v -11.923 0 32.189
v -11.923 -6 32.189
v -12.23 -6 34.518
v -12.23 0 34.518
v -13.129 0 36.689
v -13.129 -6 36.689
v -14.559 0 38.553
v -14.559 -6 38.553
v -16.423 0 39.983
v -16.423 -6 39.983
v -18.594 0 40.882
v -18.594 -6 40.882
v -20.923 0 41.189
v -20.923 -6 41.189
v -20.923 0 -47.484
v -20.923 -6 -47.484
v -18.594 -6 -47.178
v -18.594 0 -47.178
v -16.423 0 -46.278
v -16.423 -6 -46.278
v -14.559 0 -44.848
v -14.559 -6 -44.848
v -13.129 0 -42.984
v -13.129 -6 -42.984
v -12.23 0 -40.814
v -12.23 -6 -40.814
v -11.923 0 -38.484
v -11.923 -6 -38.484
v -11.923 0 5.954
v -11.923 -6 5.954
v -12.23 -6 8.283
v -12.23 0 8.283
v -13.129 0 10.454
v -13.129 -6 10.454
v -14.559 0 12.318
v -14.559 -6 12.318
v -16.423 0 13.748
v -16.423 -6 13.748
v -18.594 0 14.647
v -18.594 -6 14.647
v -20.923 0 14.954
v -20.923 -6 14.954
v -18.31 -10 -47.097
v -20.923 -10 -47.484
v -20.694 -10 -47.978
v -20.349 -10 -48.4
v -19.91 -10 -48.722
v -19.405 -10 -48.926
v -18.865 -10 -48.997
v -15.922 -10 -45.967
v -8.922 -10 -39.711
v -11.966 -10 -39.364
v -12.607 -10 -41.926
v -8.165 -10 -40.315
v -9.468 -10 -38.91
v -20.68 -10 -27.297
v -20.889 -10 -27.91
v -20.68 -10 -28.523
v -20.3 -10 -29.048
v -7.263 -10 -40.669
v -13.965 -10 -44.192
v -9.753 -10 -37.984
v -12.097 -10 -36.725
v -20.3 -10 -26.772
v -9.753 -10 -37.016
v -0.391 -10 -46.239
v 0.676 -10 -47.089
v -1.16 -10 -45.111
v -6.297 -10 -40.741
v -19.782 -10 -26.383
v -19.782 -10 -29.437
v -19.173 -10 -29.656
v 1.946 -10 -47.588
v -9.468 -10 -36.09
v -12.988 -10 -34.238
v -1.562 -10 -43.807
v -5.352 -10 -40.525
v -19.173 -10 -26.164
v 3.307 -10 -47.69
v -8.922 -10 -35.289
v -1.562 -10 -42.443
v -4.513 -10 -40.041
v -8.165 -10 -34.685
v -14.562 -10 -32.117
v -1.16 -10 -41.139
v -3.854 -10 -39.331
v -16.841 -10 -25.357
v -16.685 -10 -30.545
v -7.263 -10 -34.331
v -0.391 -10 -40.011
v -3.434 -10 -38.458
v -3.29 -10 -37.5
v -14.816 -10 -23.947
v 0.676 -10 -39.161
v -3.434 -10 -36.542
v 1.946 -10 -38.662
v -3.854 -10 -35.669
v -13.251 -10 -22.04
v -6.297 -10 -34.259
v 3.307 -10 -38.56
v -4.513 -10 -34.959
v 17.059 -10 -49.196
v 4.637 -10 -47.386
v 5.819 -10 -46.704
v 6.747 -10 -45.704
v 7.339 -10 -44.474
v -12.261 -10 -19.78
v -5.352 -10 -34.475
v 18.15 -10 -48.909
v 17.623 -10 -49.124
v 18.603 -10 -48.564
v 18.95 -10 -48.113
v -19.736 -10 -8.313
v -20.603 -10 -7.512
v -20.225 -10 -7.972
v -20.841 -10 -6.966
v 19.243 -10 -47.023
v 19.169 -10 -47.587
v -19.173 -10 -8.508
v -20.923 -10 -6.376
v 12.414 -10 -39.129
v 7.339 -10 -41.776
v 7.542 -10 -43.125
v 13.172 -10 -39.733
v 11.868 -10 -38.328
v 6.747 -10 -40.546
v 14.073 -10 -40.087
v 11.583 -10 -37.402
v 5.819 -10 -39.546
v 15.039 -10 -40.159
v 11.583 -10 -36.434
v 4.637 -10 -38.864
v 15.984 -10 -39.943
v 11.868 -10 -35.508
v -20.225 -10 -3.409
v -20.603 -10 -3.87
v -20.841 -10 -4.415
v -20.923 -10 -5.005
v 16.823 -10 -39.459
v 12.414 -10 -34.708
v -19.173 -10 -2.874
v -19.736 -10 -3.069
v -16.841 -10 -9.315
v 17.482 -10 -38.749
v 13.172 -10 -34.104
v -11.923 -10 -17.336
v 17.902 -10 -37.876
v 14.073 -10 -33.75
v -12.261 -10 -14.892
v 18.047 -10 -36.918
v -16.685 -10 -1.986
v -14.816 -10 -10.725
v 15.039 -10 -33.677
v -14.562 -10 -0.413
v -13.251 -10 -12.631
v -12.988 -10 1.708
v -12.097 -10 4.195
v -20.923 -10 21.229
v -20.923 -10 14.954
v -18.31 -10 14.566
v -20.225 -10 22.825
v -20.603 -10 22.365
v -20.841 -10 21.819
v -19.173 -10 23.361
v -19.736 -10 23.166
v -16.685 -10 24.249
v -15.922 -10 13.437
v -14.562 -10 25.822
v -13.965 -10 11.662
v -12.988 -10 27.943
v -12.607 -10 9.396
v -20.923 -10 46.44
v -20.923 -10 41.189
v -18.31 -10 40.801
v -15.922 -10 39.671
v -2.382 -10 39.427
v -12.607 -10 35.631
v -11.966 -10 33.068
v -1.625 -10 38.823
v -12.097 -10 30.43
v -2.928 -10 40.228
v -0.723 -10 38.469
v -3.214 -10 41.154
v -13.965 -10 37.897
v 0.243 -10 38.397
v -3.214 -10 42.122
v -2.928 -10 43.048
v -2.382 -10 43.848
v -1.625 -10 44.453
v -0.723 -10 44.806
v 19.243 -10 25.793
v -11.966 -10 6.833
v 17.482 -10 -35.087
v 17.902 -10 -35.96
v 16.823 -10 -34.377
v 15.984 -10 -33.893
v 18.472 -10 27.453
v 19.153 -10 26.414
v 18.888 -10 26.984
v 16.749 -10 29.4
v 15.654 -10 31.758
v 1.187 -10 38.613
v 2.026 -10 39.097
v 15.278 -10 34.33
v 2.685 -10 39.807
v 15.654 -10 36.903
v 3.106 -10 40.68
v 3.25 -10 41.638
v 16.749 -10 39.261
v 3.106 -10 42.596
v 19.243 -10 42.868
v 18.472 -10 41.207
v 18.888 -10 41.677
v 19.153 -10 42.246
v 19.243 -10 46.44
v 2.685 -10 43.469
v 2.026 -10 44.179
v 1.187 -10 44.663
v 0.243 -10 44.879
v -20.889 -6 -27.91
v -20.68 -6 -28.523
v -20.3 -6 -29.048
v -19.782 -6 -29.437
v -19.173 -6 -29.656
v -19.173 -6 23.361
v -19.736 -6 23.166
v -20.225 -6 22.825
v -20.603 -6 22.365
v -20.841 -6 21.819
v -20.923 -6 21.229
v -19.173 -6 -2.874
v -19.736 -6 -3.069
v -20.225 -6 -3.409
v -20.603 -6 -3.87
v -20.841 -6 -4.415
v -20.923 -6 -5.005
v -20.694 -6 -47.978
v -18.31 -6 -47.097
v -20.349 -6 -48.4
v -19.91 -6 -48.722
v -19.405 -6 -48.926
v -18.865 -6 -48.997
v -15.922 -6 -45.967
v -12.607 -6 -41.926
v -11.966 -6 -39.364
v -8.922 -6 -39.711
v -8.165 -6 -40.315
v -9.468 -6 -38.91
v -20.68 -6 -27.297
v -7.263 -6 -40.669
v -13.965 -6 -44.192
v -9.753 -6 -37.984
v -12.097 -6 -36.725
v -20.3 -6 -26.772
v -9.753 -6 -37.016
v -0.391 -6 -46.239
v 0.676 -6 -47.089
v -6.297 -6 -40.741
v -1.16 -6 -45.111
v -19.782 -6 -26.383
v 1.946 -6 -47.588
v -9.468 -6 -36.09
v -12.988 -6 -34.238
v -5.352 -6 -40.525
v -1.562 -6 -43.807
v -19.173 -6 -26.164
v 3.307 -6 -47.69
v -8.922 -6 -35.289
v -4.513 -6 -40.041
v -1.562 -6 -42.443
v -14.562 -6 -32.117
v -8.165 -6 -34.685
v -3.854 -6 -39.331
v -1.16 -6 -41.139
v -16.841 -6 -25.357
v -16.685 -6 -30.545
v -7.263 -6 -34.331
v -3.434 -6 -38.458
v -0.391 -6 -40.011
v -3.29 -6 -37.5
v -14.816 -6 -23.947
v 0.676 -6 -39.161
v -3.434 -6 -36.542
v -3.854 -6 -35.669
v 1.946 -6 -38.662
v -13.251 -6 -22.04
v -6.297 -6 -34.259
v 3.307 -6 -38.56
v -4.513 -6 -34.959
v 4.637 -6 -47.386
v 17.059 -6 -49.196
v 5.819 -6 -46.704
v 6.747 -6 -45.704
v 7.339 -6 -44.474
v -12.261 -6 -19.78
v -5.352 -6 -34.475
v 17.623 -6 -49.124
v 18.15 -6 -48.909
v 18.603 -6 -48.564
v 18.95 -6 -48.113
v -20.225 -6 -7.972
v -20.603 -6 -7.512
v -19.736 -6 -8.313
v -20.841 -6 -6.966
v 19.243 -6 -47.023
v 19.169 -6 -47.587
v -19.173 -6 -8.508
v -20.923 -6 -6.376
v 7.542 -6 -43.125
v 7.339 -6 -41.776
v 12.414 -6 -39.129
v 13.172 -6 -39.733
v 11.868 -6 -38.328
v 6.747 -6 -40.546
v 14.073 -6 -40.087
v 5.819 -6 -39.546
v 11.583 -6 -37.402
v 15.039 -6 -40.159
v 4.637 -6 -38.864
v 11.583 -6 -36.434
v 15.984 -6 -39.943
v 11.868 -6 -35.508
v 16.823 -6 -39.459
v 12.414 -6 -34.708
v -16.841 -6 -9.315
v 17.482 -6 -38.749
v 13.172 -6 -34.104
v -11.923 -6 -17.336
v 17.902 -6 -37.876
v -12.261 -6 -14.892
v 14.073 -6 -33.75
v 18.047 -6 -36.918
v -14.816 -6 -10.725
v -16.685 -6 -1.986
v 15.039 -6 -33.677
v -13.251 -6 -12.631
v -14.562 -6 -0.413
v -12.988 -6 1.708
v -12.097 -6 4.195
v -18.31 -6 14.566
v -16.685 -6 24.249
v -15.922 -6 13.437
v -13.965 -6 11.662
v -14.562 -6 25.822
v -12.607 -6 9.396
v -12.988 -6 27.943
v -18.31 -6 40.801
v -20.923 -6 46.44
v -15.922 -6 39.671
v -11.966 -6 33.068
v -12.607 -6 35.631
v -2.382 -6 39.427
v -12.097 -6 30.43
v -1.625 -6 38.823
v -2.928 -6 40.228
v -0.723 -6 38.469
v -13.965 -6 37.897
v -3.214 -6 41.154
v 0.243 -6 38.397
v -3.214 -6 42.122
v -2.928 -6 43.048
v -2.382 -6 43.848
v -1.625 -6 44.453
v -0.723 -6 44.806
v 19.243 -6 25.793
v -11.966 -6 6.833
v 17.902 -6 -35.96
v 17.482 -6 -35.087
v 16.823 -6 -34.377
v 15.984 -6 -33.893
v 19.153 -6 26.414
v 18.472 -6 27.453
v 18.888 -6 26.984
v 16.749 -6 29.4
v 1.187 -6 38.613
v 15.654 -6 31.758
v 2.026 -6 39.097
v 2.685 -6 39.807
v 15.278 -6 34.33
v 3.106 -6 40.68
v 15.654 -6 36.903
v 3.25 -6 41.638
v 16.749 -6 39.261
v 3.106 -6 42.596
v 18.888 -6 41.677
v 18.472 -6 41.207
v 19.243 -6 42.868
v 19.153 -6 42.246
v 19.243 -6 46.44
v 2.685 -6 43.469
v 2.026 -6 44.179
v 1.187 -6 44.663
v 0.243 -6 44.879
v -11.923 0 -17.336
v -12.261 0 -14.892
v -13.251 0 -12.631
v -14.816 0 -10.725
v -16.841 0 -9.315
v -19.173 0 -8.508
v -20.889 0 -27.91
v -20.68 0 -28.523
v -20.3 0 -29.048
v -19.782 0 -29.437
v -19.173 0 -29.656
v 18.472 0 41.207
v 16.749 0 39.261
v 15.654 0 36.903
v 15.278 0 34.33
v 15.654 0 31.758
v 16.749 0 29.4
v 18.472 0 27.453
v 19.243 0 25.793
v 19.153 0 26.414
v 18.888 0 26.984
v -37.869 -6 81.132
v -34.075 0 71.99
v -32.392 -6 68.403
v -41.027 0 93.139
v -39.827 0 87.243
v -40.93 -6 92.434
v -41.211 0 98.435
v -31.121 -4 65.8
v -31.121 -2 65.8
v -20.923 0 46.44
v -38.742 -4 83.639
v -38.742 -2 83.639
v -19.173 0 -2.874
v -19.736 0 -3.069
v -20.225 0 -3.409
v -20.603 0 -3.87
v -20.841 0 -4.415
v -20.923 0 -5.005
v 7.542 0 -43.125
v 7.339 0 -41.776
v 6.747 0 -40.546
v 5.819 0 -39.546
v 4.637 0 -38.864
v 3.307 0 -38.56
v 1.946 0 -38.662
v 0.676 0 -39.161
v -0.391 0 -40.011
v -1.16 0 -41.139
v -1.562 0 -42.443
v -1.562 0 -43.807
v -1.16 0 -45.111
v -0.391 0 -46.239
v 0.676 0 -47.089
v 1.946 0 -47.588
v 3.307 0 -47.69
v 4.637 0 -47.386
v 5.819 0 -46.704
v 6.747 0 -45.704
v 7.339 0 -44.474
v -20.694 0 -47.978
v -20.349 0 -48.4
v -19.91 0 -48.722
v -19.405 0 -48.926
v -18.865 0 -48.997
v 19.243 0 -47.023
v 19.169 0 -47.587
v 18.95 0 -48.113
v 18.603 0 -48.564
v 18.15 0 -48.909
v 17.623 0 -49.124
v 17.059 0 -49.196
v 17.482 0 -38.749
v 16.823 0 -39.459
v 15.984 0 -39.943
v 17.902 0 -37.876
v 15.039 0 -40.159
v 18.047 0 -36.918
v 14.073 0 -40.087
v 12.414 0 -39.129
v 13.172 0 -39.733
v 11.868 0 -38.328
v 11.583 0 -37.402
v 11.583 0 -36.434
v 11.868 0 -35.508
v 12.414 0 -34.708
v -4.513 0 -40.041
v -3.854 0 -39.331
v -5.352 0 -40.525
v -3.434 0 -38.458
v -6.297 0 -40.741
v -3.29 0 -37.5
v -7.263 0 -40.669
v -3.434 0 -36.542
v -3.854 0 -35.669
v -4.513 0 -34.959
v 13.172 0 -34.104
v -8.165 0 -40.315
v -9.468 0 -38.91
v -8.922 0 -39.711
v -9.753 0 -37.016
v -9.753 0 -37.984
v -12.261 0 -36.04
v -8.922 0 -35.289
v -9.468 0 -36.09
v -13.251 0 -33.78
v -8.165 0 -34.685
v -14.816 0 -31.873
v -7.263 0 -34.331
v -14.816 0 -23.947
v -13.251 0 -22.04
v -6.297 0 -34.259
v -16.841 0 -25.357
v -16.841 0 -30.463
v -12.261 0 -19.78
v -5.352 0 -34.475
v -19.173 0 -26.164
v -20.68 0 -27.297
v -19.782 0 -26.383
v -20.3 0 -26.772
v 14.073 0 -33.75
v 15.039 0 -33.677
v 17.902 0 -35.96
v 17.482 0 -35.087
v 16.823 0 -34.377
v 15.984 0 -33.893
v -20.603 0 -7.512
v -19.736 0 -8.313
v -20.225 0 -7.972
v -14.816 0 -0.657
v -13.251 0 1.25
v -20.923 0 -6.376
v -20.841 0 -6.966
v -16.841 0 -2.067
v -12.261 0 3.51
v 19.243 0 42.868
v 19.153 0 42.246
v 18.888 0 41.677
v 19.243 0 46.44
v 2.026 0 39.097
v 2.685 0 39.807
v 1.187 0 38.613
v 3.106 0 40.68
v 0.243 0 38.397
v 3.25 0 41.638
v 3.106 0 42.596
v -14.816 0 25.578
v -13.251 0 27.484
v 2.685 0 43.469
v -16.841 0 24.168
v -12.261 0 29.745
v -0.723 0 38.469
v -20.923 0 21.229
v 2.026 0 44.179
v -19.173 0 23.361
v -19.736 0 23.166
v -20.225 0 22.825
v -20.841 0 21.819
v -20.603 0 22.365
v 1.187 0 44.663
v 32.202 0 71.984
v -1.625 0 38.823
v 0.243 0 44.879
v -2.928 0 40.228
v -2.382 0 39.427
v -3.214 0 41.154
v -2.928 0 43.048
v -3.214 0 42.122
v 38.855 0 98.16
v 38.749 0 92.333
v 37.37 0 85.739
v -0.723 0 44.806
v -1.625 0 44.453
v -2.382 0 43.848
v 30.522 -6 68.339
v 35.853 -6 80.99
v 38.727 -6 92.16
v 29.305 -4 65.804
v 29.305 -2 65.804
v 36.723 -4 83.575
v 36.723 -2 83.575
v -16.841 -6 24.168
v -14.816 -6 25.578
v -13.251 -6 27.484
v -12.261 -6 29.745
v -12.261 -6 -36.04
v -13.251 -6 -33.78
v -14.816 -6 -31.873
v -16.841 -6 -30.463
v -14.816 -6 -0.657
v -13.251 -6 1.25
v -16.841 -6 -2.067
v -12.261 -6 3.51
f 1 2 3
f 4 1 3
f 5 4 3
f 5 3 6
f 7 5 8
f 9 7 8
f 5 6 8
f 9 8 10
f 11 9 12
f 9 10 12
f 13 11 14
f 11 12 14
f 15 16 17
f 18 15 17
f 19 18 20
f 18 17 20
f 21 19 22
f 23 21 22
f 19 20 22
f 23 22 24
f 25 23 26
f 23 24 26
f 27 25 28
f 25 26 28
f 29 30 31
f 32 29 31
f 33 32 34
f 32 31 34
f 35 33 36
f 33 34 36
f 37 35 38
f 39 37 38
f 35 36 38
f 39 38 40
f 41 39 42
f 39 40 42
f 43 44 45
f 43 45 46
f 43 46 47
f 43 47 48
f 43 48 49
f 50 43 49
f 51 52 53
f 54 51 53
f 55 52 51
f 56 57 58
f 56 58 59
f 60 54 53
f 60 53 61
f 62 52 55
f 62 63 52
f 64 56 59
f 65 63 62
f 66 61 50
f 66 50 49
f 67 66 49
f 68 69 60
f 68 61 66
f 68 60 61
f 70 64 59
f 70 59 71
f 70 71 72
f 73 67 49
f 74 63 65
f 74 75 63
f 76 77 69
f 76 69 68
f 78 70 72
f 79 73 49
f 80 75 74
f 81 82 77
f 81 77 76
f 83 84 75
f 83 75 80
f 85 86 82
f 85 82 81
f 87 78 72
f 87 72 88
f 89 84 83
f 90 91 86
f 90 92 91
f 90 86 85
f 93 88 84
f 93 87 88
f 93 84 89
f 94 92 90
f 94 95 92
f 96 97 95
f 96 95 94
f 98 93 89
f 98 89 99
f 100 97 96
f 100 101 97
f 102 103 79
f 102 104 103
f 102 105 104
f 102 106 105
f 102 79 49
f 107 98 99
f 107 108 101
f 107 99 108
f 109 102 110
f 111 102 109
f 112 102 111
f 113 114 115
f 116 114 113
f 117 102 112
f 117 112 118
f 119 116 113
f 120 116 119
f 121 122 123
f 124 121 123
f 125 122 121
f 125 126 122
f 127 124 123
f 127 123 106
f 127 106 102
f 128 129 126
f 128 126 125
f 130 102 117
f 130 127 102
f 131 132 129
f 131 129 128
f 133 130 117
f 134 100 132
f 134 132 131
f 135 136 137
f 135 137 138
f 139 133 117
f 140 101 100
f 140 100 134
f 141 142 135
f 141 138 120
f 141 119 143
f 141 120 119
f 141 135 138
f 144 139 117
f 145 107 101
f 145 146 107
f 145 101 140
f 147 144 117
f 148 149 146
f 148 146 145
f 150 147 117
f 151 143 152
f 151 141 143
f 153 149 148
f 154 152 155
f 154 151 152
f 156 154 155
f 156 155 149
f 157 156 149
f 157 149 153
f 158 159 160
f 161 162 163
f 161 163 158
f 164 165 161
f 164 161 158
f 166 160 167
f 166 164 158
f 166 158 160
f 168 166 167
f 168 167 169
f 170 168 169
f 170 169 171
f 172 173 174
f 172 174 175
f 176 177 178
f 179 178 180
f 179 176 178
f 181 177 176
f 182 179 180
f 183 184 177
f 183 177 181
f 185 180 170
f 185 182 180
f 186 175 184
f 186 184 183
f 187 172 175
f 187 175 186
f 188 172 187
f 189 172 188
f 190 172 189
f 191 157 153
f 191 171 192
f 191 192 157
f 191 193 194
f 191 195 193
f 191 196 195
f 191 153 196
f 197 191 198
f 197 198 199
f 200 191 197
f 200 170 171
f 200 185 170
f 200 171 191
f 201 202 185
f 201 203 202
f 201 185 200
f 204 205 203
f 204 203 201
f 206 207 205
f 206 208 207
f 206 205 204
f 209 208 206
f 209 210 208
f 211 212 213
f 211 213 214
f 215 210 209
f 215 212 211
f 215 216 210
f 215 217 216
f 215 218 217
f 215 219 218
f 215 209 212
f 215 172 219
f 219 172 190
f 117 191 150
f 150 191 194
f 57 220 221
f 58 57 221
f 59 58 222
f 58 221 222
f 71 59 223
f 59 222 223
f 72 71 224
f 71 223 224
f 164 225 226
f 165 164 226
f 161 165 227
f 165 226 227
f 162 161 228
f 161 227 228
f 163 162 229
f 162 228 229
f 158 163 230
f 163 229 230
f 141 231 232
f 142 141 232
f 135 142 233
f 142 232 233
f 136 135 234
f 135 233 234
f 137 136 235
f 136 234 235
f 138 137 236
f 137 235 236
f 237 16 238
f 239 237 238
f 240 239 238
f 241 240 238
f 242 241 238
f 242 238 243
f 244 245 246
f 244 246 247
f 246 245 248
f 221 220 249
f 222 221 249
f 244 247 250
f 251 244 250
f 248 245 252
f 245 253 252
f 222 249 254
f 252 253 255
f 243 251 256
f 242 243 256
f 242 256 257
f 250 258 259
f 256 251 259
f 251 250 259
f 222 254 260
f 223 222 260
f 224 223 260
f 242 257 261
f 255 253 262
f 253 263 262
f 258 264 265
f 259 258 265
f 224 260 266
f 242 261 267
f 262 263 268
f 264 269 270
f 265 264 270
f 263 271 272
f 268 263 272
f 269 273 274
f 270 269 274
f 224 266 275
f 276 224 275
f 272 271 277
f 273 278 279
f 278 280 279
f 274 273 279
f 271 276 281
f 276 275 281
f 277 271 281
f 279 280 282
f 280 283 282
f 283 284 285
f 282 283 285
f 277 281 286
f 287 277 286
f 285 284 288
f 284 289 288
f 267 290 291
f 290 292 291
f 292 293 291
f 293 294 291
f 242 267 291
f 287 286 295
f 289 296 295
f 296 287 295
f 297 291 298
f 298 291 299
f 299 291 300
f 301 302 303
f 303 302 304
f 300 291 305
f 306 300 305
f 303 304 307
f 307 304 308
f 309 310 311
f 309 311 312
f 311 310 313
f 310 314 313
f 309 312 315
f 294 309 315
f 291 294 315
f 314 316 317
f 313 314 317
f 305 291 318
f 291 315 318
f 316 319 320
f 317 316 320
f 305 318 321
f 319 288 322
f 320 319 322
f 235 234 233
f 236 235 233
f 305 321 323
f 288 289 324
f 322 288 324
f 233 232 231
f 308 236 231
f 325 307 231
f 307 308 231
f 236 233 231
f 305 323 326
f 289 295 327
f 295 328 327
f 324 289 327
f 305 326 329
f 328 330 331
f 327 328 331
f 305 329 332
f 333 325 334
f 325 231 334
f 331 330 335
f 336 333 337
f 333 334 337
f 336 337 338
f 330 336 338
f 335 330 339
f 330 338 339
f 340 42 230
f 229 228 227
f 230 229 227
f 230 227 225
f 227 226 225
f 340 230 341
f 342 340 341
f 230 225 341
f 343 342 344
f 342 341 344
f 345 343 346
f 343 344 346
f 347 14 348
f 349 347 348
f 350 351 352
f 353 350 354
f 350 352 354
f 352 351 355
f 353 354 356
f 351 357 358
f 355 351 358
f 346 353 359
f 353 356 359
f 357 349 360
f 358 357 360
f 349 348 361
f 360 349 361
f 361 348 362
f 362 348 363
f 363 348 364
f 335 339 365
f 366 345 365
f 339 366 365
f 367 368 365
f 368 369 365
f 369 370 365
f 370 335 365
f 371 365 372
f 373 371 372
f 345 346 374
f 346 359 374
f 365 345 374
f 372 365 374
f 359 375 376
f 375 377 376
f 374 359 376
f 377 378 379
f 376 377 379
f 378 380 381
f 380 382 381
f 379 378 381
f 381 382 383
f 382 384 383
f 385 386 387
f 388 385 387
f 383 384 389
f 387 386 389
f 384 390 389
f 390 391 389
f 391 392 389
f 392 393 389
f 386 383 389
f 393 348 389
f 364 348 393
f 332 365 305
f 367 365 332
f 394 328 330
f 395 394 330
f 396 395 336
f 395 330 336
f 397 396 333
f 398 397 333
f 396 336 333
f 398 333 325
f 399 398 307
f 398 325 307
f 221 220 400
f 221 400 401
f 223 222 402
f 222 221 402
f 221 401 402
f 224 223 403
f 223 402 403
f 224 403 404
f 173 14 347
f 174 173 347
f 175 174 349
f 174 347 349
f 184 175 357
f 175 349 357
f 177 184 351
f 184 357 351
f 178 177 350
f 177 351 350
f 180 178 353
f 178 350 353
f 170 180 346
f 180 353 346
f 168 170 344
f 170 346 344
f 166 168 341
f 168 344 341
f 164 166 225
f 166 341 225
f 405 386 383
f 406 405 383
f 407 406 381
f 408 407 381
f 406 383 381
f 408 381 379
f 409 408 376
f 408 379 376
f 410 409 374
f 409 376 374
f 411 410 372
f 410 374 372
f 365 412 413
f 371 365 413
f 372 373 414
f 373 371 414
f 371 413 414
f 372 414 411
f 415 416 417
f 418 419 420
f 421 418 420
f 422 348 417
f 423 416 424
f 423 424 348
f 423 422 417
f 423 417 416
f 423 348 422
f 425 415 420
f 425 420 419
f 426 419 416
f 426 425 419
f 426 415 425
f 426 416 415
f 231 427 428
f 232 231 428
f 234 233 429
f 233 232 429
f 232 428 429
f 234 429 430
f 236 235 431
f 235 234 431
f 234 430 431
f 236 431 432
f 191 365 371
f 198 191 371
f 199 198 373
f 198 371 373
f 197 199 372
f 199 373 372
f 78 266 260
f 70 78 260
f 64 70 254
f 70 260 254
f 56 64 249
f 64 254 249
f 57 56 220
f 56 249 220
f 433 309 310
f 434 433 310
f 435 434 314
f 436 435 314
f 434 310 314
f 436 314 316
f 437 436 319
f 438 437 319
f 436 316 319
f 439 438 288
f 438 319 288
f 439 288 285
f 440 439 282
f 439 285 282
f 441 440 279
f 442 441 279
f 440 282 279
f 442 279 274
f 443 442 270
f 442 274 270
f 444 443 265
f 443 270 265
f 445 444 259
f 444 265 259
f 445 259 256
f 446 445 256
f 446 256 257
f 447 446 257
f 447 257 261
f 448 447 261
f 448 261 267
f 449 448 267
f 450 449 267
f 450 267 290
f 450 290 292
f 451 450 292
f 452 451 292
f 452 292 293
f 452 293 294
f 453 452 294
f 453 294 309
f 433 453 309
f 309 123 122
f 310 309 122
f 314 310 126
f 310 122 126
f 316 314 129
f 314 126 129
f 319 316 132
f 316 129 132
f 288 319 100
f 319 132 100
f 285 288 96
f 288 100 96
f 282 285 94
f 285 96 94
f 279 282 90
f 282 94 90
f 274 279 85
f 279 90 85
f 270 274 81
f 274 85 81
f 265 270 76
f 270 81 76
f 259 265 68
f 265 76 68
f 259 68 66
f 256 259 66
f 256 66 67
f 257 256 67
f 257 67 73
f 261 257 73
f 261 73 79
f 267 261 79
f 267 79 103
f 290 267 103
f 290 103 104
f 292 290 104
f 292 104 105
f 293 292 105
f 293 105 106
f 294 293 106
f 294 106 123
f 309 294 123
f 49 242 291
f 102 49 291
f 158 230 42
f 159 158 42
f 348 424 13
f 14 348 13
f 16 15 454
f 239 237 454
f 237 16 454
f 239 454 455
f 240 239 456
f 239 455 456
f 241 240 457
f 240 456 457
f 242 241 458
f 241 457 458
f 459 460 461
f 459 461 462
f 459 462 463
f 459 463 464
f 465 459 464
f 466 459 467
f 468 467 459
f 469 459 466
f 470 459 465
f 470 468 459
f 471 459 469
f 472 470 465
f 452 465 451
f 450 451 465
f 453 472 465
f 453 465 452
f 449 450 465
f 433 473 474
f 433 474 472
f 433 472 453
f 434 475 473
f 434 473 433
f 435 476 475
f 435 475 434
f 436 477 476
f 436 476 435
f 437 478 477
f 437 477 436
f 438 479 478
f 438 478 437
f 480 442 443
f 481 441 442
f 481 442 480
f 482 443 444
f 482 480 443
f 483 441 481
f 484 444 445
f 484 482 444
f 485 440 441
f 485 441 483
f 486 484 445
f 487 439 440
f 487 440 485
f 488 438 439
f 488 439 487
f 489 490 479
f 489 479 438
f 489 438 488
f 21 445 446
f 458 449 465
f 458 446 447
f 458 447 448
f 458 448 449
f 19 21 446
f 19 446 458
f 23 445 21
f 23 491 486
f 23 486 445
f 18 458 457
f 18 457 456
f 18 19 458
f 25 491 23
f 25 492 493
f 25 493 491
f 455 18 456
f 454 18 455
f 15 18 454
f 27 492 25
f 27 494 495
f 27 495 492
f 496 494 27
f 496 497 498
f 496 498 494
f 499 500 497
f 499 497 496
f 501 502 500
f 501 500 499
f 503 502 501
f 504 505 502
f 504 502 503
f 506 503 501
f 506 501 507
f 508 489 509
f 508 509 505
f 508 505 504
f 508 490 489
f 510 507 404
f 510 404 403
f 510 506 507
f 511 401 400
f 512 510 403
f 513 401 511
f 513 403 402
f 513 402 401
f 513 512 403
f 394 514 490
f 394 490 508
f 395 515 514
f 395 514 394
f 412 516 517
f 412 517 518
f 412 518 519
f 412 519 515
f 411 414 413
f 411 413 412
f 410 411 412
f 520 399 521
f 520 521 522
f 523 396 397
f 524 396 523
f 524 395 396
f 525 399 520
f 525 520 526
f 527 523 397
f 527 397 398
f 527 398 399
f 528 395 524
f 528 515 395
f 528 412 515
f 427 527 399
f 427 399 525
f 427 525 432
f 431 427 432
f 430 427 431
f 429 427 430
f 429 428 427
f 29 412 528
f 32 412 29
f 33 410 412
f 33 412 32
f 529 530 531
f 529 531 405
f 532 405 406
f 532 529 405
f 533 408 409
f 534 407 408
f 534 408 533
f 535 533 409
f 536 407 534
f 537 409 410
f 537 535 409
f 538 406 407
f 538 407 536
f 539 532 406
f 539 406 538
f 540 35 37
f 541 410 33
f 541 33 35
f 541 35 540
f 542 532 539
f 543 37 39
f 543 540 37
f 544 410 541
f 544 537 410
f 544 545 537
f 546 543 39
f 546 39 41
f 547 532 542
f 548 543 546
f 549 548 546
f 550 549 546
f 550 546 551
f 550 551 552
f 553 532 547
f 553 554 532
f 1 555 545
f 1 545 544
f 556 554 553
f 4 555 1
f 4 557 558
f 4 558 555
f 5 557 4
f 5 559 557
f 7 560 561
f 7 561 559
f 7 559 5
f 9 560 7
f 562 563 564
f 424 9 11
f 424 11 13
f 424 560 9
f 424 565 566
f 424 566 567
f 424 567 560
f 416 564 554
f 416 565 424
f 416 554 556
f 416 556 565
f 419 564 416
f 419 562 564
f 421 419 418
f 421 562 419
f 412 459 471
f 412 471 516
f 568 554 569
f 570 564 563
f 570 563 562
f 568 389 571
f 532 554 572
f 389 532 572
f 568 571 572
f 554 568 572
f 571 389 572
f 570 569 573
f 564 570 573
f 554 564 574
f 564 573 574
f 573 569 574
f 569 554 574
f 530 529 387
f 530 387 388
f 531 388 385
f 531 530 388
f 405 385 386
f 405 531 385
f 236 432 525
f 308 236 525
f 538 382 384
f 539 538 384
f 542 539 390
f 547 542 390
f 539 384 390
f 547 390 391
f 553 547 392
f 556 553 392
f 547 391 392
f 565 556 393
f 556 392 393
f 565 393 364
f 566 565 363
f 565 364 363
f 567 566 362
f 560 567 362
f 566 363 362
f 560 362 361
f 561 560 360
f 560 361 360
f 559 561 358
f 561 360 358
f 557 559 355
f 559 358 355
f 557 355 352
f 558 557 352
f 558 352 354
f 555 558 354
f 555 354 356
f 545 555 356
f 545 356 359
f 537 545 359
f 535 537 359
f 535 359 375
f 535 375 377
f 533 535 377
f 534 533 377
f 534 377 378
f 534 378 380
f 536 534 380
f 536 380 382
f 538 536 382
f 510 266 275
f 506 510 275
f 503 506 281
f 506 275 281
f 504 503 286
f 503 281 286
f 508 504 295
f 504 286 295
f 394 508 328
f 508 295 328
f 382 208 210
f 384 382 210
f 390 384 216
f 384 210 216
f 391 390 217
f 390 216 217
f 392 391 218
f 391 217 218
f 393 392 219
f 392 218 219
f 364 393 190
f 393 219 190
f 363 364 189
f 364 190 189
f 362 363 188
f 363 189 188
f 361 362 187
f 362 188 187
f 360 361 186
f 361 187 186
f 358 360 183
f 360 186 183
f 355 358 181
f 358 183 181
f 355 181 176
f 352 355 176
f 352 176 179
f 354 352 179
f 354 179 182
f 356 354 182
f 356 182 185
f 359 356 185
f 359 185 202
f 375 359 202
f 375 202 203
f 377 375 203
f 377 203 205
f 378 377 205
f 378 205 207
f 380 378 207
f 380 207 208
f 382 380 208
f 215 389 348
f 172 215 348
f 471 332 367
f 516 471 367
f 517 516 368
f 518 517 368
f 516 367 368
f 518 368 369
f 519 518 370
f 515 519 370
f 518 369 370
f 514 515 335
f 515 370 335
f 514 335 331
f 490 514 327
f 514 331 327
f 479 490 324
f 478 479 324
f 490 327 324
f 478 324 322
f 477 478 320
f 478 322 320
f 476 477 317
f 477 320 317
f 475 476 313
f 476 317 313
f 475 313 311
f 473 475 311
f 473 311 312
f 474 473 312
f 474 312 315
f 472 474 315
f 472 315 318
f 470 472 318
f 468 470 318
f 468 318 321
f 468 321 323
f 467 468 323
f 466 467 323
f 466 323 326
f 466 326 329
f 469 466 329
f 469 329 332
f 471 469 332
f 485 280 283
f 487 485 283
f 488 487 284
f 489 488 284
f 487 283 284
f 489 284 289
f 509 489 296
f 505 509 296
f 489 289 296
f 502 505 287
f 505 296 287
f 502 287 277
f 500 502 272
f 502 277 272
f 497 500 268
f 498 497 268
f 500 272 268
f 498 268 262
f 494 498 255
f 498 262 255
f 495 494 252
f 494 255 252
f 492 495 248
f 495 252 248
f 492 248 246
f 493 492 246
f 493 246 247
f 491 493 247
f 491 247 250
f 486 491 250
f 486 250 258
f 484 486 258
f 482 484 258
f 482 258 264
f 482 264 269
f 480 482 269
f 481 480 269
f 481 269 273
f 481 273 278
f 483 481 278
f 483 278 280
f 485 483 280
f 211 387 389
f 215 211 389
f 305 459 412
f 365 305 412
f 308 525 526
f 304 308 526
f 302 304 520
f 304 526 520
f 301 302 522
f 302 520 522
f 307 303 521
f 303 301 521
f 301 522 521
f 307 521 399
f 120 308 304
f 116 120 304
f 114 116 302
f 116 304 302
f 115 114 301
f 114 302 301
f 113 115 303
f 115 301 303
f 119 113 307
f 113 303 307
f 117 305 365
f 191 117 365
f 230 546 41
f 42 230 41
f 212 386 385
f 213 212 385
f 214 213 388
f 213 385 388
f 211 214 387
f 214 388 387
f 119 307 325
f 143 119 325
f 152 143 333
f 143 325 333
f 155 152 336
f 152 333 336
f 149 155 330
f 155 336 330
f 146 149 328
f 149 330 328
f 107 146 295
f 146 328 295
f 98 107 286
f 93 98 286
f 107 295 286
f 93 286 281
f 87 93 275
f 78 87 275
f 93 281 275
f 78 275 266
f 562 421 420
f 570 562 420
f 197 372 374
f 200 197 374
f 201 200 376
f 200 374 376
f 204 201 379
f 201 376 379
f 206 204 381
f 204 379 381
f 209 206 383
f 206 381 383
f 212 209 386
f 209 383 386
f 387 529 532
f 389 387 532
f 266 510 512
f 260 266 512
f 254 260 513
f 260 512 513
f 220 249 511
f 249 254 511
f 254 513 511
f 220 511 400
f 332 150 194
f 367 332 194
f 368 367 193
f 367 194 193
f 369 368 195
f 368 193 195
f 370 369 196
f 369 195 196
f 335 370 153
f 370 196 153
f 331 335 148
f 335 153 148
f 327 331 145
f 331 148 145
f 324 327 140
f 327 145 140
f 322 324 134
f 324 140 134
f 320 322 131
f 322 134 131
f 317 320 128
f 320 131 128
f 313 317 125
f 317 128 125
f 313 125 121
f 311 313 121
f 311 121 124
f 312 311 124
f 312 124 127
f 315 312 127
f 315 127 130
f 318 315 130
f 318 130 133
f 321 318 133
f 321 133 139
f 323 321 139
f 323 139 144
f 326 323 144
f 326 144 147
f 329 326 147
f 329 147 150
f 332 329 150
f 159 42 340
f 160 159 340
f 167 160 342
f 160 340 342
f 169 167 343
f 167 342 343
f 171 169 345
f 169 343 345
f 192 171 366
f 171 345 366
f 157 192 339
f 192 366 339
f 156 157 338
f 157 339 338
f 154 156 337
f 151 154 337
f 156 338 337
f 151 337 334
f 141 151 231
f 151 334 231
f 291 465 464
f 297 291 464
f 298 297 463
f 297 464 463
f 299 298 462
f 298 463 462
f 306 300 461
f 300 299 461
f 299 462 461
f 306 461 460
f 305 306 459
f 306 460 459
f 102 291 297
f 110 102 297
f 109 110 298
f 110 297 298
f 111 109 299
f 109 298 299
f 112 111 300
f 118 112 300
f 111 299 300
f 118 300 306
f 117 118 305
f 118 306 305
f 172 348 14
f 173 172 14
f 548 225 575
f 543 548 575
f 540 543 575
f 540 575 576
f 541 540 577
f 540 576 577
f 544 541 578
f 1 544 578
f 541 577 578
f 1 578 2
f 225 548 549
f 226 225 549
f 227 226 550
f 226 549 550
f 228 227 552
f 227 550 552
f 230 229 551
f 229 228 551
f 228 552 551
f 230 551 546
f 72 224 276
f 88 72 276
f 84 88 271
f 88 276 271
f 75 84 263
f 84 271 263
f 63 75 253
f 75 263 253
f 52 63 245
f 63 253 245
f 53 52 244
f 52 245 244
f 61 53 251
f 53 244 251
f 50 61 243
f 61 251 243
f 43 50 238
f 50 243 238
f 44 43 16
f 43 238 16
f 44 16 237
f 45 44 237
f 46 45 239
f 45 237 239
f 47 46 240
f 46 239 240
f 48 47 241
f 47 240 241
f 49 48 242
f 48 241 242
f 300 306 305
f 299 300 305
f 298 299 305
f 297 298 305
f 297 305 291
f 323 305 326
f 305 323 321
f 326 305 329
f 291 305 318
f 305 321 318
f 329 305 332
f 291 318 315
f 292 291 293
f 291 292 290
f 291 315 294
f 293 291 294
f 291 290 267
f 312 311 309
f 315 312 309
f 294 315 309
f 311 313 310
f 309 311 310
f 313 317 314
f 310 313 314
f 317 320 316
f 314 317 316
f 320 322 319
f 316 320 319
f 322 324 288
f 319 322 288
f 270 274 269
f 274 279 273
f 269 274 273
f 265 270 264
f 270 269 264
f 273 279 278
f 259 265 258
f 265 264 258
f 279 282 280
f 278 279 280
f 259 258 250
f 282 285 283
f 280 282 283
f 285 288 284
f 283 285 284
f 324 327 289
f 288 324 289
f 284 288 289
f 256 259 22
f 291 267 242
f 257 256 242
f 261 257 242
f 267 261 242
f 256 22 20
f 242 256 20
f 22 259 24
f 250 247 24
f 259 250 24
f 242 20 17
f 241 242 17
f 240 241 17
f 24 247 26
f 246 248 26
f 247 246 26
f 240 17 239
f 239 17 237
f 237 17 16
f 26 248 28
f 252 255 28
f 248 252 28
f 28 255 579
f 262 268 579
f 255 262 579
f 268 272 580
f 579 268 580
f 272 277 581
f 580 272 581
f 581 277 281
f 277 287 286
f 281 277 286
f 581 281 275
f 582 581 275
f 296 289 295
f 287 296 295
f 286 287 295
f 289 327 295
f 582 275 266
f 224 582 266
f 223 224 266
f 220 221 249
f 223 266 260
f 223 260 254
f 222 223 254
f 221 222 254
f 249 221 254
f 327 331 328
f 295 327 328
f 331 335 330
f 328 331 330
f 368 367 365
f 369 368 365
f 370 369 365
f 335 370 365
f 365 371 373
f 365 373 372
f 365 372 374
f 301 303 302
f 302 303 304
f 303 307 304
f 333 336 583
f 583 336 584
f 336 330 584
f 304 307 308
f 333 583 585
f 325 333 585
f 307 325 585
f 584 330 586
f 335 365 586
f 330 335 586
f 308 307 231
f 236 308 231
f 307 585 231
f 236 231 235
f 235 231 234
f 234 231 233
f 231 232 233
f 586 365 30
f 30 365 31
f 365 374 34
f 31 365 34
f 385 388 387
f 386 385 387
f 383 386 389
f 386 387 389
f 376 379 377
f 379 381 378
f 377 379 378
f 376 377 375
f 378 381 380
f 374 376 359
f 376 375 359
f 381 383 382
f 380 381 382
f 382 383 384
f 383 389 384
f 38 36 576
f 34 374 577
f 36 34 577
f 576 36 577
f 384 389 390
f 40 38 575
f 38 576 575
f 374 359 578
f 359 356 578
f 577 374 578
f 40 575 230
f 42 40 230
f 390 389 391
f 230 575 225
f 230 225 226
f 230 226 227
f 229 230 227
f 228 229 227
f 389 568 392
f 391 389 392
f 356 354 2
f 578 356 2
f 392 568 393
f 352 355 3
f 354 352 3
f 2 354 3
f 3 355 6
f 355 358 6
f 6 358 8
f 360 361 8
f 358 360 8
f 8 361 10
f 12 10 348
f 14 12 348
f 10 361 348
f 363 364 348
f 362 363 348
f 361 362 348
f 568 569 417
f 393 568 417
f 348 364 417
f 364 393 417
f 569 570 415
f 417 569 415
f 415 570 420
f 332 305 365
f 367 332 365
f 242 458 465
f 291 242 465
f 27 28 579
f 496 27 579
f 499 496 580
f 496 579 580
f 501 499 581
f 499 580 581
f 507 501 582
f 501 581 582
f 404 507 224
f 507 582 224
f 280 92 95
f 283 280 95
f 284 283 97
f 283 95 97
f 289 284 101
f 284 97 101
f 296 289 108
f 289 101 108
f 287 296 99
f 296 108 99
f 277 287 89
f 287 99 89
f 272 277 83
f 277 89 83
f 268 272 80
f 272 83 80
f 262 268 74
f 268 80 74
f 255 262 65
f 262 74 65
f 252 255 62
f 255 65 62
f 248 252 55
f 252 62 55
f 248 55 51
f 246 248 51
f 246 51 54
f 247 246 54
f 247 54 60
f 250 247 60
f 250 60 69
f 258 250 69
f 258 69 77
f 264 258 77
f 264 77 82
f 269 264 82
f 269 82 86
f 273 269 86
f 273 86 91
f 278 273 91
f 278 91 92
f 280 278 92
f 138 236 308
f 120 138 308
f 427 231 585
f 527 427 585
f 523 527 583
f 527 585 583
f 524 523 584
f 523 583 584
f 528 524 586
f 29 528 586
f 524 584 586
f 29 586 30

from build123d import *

# Parameters (mm, degrees)
F2_DEPTH    = 6
F3_T1_DEPTH = 115.827858657
F6_DEPTH    = 25
F7_T1_DEPTH = 15.7974131941
F7_T3_DEPTH = 16.290436999
F7_T5_DEPTH = 16.9242525679
F7_T7_DEPTH = 11.385777601
F9_DEPTH    = 4
F10_R       = 3.25
F10_R_2     = 4.5777520803
F11_DEPTH   = 25


# Not quite as in the source:
# - a fillet or chamfer that OpenCascade refuses, or shapes differently, is made with other operations: its cross-section is extruded or revolved along the edge and cut away or added


with BuildPart() as f2:
    # F1 (on face) → F2 (new body)
    with BuildSketch(Plane.XZ):
        with BuildLine():
            add(Edge.make_bspline(
                [(-20.9231331974, 46.4401495715), (-31.8316802492, 66.5727386597), (-42.740227301, 86.705327748), (-41.1091856658, 99.4347333908)],
                knots=[0, 0, 0, 0, 0.6149906941, 0.6149906941, 0.6149906941, 0.6149906941], degree=3))
            Line((-20.9231331974, 46.4401495715), (19.2433385447, 46.4401495715))
            add(Edge.make_bspline(
                [(19.2433385447, 46.4401495715), (30.0307332183, 66.6034940791), (40.8181278918, 86.7668385867), (38.7146398425, 99.160425365)],
                knots=[0, 0, 0, 0, 0.6129577408, 0.6129577408, 0.6129577408, 0.6129577408], degree=3))
            Line((38.7146398425, 99.160425365), (-41.1091856658, 99.4347333908))
        make_face()
        Polygon((19.2433385447, 46.4401495715), (-20.9231331974, 46.4401495715), (-20.9231331974, -48.9854468352), (19.2433385447, -49.2077428815), align=None)
    extrude(amount=F2_DEPTH)

    # F3: chamfer of 7 on 1 edges, made by hand

    # F3_s2 → F3_t1 (cut)
    with BuildSketch(Plane(origin=(56.3751046529, 0, -0.1937284209), x_dir=(0, 1, 0), z_dir=(-0.9999940956, 0, 0.0034363976))):
        Polygon((1, -99.2928787763), (-6, -92.2928787763), (-6, -99.2928787763), align=None)
    extrude(amount=F3_T1_DEPTH, mode=Mode.SUBTRACT)

    # F4 (on face) + F5 (on face) → F6 (cut)
    with BuildSketch(Plane.XZ.offset(6)):
        with BuildLine():
            ThreePointArc((-20.9231331974, 23.1888029575), (-14.5591721667, 25.8248419269), (-11.9231331974, 32.1888029575))
            ThreePointArc((-11.9231331974, 32.1888029575), (-14.5591721667, 38.5527639882), (-20.9231331974, 41.1888029575))
            Line((-20.9231331974, 41.1888029575), (-20.9231331974, 23.1888029575))
        make_face()
        with BuildLine():
            ThreePointArc((-11.9231331974, 5.9541198425), (-14.5591721667, 12.3180808732), (-20.9231331974, 14.9541198425))
            Line((-20.9231331974, 14.9541198425), (-20.9231331974, -3.0458801575))
            ThreePointArc((-20.9231331974, -3.0458801575), (-14.5591721667, -0.4098411882), (-11.9231331974, 5.9541198425))
        make_face()
        with BuildLine():
            ThreePointArc((-11.9231331974, -17.3358544707), (-14.5591721667, -10.9718934401), (-20.9231331974, -8.3358544707))
            Line((-20.9231331974, -8.3358544707), (-20.9231331974, -26.3358544707))
            ThreePointArc((-20.9231331974, -26.3358544707), (-14.5591721667, -23.6998155014), (-11.9231331974, -17.3358544707))
        make_face()
        with BuildLine():
            ThreePointArc((-11.9231331974, -38.484223187), (-14.5591721667, -32.1202621563), (-20.9231331974, -29.484223187))
            Line((-20.9231331974, -29.484223187), (-20.9231331974, -47.484223187))
            ThreePointArc((-20.9231331974, -47.484223187), (-14.5591721667, -44.8481842176), (-11.9231331974, -38.484223187))
        make_face()
    with BuildSketch(Plane.XZ.offset(6)):
        with BuildLine():
            Line((19.2433385447, 26.8704213686), (19.2433385447, 41.7904041223))
            ThreePointArc((19.2433385447, 41.7904041223), (15.2780707777, 34.3304127455), (19.2433385447, 26.8704213686))
        make_face()
    extrude(amount=-F6_DEPTH, mode=Mode.SUBTRACT)

    # F7: fillet of radius 2.1727922061 on 9 edges, made by hand

    # F7_s2 → F7_t1 (cut)
    with BuildSketch(Plane.XZ.offset(-4.898706597)):
        with BuildLine():
            ThreePointArc((-19.172887646, 23.3606298447), (-20.4294973343, 22.6082546705), (-20.9231331974, 21.2293203187))
            Line((-20.9231331974, 21.2293203187), (-20.9231331974, 23.1888029575))
            ThreePointArc((-20.9231331974, 23.1888029575), (-20.0438033433, 23.2318626871), (-19.172887646, 23.3606298447))
        make_face()
        with BuildLine():
            ThreePointArc((-19.172887646, -2.8740532703), (-20.4294973343, -3.6264284446), (-20.9231331974, -5.0053627963))
            Line((-20.9231331974, -5.0053627963), (-20.9231331974, -3.0458801575))
            ThreePointArc((-20.9231331974, -3.0458801575), (-20.0438033433, -3.0028204279), (-19.172887646, -2.8740532703))
        make_face()
        with BuildLine():
            ThreePointArc((-20.9231331974, -6.3763718319), (-20.4294973343, -7.7553061837), (-19.172887646, -8.5076813579))
            ThreePointArc((-19.172887646, -8.5076813579), (-20.0438033433, -8.3789142003), (-20.9231331974, -8.3358544707))
            Line((-20.9231331974, -8.3358544707), (-20.9231331974, -6.3763718319))
        make_face()
        with BuildLine():
            ThreePointArc((-19.172887646, -26.1640275835), (-20.4294973343, -26.9164027578), (-20.9231331974, -28.2953371095))
            Line((-20.9231331974, -28.2953371095), (-20.9231331974, -26.3358544707))
            ThreePointArc((-20.9231331974, -26.3358544707), (-20.0438033433, -26.2927947411), (-19.172887646, -26.1640275835))
        make_face()
        with BuildLine():
            ThreePointArc((-20.9231331974, -27.5247405482), (-20.4294973343, -28.9036748999), (-19.172887646, -29.6560500742))
            ThreePointArc((-19.172887646, -29.6560500742), (-20.0438033433, -29.5272829166), (-20.9231331974, -29.484223187))
            Line((-20.9231331974, -29.484223187), (-20.9231331974, -27.5247405482))
        make_face()
    extrude(amount=F7_T1_DEPTH, mode=Mode.SUBTRACT)

    # F7_s4 → F7_t3 (cut)
    with BuildSketch(Plane.XZ.offset(-5.1452184995)):
        with BuildLine():
            ThreePointArc((-20.9231331974, -47.484223187), (-20.1398278758, -48.5748592028), (-18.8650773156, -48.9968368743))
            Line((-18.8650773156, -48.9968368743), (-20.9231331974, -48.9854468352))
            Line((-20.9231331974, -48.9854468352), (-20.9231331974, -47.484223187))
        make_face()
    extrude(amount=F7_T3_DEPTH, mode=Mode.SUBTRACT)

    # F7_s6 → F7_t5 (cut)
    with BuildSketch(Plane.XZ.offset(-5.4621262839)):
        with BuildLine():
            ThreePointArc((17.0585214905, -49.1956512993), (18.6026851174, -48.5635340308), (19.2433385447, -47.0228923679))
            Line((19.2433385447, -47.0228923679), (19.2433385447, -49.2077428815))
            Line((19.2433385447, -49.2077428815), (17.0585214905, -49.1956512993))
        make_face()
    extrude(amount=F7_T5_DEPTH, mode=Mode.SUBTRACT)

    # F7_s8 → F7_t7 (cut)
    with BuildSketch(Plane.XZ.offset(-2.6928888005)):
        with BuildLine():
            ThreePointArc((19.2433385447, 42.8675596425), (19.0411479361, 41.9522698987), (18.4722060704, 41.2073259339))
            ThreePointArc((18.4722060704, 41.2073259339), (18.8499375305, 41.5092266762), (19.2433385447, 41.7904041223))
            Line((19.2433385447, 41.7904041223), (19.2433385447, 42.8675596425))
        make_face()
        with BuildLine():
            ThreePointArc((19.2433385447, 25.7932658484), (19.0411479361, 26.7085555922), (18.4722060704, 27.4534995571))
            ThreePointArc((18.4722060704, 27.4534995571), (18.8499375305, 27.1515988148), (19.2433385447, 26.8704213686))
            Line((19.2433385447, 26.8704213686), (19.2433385447, 25.7932658484))
        make_face()
    extrude(amount=F7_T7_DEPTH, mode=Mode.SUBTRACT)


with BuildPart() as f9:
    # F8 (on face) → F9 (new body)
    with BuildSketch(Plane.XZ.offset(6)):
        with BuildLine():
            Line((19.2433385447, 46.4401495715), (-20.9231331974, 46.4401495715))
            Line((-20.9231331974, 46.4401495715), (-20.9231331974, 41.1888029575))
            ThreePointArc((-20.9231331974, 41.1888029575), (-11.9661929269, 33.0681328116), (-19.172887646, 23.3606298447))
            ThreePointArc((-19.172887646, 23.3606298447), (-20.4294973343, 22.6082546704), (-20.9231331974, 21.2293203187))
            Line((-20.9231331974, 21.2293203187), (-20.9231331974, 14.9541198425))
            ThreePointArc((-20.9231331974, 14.9541198425), (-11.9661929269, 6.8334496966), (-19.172887646, -2.8740532703))
            ThreePointArc((-19.172887646, -2.8740532703), (-20.4294973343, -3.6264284446), (-20.9231331974, -5.0053627963))
            Line((-20.9231331974, -5.0053627963), (-20.9231331974, -6.3763718319))
            ThreePointArc((-20.9231331974, -6.3763718319), (-20.4294973343, -7.7553061836), (-19.172887646, -8.5076813579))
            ThreePointArc((-19.172887646, -8.5076813579), (-11.9231331974, -17.3358544707), (-19.172887646, -26.1640275836))
            ThreePointArc((-19.172887646, -26.1640275835), (-20.3000815705, -26.7724024071), (-20.888698119, -27.9100388289))
            ThreePointArc((-20.888698119, -27.9100388289), (-20.3000815705, -29.0476752506), (-19.172887646, -29.6560500742))
            ThreePointArc((-19.172887646, -29.6560500741), (-11.9661929269, -39.3635530411), (-20.9231331974, -47.484223187))
            ThreePointArc((-20.9231331974, -47.484223187), (-20.1398278758, -48.5748592028), (-18.8650773156, -48.9968368743))
            Line((-18.8650773156, -48.9968368743), (17.0585214905, -49.1956512993))
            ThreePointArc((17.0585214905, -49.1956512993), (18.6026851174, -48.5635340308), (19.2433385447, -47.0228923679))
            Line((19.2433385447, -47.0228923679), (19.2433385447, 25.7932658484))
            ThreePointArc((19.2433385447, 25.7932658484), (19.0411479361, 26.7085555922), (18.4722060704, 27.4534995571))
            ThreePointArc((18.4722060704, 27.4534995571), (15.2780707777, 34.3304127455), (18.4722060704, 41.2073259339))
            ThreePointArc((18.4722060704, 41.2073259339), (19.0411479361, 41.9522698987), (19.2433385447, 42.8675596425))
            Line((19.2433385447, 42.8675596425), (19.2433385447, 46.4401495715))
        make_face()
    extrude(amount=F9_DEPTH)


with BuildPart() as f11_tool:
    # F10 (on face) → F11 (new body)
    with BuildSketch(Plane.XZ.offset(10)):
        with Locations((0, 41.6379310191)):
            Circle(F10_R)
        with Locations((-6.5396036953, -37.4999977648)):
            Circle(F10_R)
        with Locations((2.9647059273, -43.124999851)):
            Circle(F10_R_2)
        with Locations((14.796603471, -36.9181036949)):
            Circle(F10_R)
    extrude(amount=-F11_DEPTH)


with BuildPart() as f2_1:
    add(f2.part)

    # F11: cut by f11_tool
    add(f11_tool.part, mode=Mode.SUBTRACT)


with BuildPart() as f9_1:
    add(f9.part)

    # F11: cut by f11_tool
    add(f11_tool.part, mode=Mode.SUBTRACT)


solid = Compound([f2_1.part, f9_1.part])
